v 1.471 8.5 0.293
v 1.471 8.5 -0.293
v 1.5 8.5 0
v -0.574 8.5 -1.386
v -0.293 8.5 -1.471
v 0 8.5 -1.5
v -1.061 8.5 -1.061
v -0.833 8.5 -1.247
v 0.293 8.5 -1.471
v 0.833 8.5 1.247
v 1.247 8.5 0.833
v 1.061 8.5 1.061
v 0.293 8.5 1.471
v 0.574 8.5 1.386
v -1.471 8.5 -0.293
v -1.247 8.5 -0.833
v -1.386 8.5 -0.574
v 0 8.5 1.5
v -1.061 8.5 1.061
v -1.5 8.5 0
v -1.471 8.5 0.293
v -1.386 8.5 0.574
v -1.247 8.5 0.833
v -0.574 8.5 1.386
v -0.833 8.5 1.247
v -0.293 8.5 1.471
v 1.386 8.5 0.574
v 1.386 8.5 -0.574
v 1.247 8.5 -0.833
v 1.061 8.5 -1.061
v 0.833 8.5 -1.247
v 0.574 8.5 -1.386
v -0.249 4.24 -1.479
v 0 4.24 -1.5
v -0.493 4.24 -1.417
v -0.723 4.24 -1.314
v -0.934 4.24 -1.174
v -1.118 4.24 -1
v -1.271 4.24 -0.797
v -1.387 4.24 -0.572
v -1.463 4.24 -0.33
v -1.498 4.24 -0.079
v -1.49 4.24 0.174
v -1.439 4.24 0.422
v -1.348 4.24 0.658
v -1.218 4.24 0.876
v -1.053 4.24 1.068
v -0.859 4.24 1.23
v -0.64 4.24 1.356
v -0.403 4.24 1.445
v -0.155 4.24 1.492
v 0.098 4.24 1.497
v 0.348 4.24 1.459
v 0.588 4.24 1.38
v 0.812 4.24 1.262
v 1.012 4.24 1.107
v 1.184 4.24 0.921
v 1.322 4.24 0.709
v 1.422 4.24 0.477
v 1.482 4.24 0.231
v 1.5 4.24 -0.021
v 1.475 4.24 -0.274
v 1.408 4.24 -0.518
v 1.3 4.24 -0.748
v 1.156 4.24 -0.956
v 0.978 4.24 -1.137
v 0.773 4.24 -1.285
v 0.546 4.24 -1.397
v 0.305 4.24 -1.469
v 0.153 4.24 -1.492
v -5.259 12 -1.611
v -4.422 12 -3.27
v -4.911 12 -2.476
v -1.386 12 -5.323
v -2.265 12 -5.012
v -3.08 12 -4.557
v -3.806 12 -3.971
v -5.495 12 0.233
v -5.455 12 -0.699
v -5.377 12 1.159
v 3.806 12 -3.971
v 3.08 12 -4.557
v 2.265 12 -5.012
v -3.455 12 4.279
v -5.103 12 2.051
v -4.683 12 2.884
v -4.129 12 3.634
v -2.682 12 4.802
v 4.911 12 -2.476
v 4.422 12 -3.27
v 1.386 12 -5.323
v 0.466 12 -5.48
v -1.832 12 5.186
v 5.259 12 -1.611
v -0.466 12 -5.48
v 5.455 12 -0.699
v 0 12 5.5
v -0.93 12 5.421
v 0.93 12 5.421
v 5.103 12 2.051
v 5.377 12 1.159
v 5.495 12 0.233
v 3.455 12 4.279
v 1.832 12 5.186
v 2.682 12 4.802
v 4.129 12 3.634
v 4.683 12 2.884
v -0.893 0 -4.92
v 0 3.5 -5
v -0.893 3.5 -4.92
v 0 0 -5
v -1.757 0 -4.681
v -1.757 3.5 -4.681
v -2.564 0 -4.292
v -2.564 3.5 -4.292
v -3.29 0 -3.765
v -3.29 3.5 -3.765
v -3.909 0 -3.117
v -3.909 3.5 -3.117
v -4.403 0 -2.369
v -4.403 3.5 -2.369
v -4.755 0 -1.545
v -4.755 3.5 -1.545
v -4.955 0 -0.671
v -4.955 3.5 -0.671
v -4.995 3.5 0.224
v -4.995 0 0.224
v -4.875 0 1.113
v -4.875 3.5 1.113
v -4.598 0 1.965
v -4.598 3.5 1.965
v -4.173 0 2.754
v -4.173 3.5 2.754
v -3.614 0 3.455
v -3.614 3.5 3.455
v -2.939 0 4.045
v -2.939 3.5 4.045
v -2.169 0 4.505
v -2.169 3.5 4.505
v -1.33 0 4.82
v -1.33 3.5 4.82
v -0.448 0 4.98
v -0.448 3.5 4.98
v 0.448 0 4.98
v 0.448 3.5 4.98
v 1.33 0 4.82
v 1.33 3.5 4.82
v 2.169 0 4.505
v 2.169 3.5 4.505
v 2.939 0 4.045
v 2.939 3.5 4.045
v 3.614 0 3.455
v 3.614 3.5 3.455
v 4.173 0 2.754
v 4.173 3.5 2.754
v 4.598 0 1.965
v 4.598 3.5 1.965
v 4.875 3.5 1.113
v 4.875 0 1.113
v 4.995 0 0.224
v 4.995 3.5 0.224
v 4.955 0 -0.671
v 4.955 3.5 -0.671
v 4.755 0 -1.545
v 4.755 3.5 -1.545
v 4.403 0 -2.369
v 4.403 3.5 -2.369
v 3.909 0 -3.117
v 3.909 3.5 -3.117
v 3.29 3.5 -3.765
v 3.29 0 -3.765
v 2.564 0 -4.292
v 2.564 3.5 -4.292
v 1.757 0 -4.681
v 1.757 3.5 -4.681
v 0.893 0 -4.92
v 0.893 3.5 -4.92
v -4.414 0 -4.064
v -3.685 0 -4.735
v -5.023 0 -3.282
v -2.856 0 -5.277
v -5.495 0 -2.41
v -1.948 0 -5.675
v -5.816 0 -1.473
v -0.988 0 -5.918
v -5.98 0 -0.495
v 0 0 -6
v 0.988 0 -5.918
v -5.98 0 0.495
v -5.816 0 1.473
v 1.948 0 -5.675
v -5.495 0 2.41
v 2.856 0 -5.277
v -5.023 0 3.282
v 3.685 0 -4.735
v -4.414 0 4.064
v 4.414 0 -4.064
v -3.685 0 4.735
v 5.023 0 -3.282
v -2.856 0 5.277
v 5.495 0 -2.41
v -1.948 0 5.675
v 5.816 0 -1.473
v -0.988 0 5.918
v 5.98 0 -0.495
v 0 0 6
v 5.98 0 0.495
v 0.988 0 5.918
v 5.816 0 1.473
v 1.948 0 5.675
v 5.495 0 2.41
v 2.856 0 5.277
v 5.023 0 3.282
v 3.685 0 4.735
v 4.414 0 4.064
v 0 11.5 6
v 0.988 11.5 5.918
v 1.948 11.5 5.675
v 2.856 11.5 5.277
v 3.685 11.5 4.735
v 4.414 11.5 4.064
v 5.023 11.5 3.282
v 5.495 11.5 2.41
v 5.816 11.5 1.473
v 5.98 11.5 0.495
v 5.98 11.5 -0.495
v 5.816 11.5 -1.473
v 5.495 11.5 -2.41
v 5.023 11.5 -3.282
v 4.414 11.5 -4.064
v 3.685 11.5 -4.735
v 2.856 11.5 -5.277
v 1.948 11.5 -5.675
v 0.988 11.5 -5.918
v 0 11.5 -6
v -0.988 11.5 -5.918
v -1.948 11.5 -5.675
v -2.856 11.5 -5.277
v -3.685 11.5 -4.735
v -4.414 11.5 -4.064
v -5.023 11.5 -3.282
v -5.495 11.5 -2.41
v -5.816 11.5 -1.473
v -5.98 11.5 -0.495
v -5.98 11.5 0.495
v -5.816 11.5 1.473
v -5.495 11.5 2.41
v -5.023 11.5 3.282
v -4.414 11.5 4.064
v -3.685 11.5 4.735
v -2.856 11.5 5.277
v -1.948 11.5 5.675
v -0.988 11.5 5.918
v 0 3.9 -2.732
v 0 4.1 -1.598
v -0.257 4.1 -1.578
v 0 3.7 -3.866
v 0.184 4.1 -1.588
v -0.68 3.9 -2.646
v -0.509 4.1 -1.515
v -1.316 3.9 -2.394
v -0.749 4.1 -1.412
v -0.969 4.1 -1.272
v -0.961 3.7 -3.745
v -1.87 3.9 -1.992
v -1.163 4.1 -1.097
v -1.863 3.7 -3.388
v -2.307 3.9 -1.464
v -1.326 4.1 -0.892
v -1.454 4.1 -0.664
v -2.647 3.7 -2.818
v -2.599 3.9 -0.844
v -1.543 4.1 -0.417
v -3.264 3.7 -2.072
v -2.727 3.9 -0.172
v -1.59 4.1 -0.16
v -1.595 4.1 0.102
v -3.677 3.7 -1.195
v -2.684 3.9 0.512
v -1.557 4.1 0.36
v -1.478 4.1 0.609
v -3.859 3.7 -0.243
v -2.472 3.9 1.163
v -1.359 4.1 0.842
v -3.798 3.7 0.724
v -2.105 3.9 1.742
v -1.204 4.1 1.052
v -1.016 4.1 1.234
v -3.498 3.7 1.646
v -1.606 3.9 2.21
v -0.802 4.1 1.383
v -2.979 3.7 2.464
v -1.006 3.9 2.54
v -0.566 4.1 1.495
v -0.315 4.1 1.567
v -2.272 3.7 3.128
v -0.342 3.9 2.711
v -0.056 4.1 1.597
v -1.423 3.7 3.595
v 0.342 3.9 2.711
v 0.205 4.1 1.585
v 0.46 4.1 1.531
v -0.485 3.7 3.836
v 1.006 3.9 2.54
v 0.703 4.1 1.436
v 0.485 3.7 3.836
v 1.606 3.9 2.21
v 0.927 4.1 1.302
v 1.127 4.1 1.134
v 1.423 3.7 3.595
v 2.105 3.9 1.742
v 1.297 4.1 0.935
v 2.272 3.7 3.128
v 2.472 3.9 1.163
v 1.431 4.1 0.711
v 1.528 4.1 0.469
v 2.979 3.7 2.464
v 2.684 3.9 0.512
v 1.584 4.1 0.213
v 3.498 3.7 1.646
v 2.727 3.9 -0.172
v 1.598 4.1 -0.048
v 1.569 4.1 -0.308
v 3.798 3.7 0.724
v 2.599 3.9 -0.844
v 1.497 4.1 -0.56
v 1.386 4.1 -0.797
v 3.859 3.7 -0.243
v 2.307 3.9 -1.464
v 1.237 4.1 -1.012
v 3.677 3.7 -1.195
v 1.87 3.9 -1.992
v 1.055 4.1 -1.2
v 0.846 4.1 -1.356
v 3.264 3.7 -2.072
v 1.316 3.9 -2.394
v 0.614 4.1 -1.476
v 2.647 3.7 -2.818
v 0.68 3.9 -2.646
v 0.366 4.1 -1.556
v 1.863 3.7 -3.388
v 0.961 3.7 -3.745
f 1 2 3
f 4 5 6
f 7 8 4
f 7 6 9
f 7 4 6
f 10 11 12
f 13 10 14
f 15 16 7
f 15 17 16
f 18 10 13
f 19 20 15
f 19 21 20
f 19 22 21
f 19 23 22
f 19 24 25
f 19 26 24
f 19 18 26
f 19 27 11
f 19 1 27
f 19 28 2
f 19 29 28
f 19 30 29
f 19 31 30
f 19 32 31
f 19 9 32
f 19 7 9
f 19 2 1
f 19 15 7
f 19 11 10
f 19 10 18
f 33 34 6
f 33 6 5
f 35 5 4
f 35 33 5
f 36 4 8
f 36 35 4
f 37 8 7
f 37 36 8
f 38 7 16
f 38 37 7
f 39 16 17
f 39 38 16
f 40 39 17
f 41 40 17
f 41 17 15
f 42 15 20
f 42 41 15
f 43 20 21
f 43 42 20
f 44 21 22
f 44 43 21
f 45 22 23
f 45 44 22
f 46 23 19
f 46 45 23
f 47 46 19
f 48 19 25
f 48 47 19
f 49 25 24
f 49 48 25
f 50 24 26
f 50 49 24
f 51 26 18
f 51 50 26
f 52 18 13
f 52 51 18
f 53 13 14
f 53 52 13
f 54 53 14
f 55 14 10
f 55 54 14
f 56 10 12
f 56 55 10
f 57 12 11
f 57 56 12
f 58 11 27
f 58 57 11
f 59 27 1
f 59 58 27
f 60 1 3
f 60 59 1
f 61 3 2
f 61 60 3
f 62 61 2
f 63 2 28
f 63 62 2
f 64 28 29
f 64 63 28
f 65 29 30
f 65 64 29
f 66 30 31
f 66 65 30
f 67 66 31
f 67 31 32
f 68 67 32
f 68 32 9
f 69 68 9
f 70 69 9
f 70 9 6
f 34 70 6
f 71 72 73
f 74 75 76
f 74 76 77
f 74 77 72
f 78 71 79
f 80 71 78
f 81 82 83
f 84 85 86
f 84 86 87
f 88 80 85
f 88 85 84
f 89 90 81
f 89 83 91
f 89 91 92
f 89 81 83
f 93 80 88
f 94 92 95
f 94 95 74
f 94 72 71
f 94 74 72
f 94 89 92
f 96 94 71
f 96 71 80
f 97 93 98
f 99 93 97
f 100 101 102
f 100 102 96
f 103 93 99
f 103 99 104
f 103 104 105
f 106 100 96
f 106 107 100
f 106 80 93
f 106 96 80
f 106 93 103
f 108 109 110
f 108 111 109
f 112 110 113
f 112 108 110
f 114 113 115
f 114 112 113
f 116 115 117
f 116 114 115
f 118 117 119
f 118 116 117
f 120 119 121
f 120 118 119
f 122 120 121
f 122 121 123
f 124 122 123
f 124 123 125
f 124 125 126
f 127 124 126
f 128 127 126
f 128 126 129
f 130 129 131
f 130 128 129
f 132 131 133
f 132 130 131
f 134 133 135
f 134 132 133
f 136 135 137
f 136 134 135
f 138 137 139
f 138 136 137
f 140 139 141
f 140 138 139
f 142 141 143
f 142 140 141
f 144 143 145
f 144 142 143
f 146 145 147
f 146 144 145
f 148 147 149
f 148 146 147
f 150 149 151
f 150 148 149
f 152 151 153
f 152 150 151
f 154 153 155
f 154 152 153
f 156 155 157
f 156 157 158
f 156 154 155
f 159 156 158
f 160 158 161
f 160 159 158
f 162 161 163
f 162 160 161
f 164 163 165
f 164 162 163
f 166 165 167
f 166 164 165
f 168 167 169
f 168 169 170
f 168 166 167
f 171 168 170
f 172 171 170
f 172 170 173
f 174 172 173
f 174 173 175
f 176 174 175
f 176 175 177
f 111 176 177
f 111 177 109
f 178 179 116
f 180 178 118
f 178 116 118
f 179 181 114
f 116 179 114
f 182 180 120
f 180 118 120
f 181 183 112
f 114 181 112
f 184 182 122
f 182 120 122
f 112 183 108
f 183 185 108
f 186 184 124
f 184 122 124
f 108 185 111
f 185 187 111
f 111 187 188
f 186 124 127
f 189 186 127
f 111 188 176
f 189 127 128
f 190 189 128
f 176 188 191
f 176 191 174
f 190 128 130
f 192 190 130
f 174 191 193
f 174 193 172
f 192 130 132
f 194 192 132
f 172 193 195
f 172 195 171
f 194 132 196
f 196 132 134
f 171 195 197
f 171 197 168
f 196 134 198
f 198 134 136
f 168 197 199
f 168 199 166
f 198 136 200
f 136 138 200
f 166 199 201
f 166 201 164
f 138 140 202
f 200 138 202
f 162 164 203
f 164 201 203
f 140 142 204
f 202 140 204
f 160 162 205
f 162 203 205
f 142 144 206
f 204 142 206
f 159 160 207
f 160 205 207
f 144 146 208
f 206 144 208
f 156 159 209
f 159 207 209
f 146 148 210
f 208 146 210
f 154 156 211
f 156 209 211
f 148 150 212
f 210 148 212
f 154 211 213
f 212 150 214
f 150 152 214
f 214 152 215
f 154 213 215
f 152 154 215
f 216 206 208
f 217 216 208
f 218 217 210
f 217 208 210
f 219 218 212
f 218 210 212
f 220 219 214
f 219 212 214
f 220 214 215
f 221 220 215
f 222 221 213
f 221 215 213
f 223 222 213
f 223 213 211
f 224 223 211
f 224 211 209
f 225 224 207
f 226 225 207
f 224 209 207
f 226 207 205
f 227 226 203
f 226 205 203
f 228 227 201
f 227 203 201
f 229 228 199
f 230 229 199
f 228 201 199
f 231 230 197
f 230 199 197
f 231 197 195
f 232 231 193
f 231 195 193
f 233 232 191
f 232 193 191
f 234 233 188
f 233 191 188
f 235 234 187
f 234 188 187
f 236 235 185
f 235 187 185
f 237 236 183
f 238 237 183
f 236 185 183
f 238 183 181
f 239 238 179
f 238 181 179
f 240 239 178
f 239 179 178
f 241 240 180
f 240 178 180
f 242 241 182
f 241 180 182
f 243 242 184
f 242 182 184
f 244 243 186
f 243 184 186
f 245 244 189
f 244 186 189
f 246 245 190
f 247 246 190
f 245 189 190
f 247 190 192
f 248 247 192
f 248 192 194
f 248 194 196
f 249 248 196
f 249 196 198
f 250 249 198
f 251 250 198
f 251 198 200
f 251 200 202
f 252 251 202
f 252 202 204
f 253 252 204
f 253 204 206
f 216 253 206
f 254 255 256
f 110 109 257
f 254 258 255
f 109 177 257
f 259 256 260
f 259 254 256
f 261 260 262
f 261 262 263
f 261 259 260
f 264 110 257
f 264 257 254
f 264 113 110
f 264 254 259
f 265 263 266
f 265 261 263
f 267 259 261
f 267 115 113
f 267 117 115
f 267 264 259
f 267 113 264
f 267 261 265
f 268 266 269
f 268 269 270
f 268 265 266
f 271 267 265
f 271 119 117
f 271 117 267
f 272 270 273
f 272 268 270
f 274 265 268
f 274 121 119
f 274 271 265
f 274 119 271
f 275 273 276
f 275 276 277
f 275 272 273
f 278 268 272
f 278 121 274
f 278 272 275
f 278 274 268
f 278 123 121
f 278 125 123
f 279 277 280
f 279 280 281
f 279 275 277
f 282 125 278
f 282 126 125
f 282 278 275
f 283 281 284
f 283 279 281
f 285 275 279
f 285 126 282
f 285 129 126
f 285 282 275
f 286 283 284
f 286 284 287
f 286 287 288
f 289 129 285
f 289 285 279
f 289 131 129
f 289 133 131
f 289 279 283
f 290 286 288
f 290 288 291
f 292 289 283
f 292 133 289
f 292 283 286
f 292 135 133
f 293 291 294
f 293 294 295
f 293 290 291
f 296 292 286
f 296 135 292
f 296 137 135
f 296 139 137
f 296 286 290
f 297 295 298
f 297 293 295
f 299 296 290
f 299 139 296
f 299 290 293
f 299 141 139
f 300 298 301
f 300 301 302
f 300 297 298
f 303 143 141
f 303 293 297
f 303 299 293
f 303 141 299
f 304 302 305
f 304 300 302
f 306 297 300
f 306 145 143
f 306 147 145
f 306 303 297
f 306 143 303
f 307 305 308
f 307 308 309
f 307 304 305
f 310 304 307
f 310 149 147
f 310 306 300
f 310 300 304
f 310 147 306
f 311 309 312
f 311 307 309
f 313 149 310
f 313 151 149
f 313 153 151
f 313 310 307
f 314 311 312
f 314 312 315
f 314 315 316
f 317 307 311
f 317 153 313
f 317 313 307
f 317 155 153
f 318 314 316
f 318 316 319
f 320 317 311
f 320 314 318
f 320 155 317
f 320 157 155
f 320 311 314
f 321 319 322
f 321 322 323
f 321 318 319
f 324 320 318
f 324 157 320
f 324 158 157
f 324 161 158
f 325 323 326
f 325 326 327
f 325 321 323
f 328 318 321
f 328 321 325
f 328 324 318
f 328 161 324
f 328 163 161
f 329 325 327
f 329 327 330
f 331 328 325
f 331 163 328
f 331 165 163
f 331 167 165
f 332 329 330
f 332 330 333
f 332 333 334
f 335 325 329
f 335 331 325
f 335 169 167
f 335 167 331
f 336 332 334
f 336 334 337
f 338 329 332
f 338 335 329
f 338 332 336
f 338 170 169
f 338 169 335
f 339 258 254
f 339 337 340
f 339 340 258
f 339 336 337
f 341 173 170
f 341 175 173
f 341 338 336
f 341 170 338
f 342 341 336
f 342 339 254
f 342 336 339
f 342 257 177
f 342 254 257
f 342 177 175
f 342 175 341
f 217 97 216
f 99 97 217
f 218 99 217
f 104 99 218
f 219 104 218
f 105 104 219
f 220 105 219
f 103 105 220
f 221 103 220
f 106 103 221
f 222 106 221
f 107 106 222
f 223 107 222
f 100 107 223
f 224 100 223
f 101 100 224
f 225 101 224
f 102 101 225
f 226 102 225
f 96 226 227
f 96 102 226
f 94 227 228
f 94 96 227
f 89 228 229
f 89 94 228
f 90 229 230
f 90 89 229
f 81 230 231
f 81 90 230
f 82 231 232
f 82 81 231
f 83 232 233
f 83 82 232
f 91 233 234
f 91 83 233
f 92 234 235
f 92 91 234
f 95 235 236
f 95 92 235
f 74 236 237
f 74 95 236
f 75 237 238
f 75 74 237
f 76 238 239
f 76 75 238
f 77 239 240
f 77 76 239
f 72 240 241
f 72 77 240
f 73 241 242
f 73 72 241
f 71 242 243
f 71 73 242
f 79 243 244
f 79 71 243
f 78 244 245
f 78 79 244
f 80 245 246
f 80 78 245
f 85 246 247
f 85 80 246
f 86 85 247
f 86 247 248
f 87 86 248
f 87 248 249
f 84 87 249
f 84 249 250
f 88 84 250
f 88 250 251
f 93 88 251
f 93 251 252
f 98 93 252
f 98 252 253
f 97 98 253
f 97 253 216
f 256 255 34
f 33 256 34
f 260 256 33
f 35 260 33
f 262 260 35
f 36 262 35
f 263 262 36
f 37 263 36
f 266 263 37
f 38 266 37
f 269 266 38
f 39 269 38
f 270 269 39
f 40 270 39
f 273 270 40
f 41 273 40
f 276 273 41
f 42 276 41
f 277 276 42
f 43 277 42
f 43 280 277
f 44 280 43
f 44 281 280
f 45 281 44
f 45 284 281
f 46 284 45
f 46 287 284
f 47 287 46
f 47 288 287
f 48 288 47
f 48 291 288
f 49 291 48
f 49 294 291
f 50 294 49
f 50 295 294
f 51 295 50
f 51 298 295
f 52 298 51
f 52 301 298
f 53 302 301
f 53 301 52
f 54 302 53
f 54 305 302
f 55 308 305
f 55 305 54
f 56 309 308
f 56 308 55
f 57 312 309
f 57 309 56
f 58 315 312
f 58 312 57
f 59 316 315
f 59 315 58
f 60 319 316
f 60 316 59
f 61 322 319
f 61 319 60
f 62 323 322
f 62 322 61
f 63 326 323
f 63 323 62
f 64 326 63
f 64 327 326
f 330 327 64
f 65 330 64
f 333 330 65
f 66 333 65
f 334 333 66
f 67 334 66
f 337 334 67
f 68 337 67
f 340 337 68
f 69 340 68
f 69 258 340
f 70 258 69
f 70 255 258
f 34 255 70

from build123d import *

# Parameters (mm, degrees)
SKETCH1_R           = 6
BOSS_EXTRUDE1_DEPTH = 12
CHAMFER1_SIZE       = 0.1
CHAMFER1_SIZE2      = 0.123280305
CHAMFER2_SIZE       = 0.5


with BuildPart() as part:
    # Sketch1 → Boss-Extrude1 (new body)
    with BuildSketch(Plane(origin=(0, 0, 0), x_dir=(1, 0, 0), z_dir=(0, 1, 0))):
        with Locations(Location((0, 0, 0), (0, 0, 270))):
            Circle(SKETCH1_R)
    extrude(amount=BOSS_EXTRUDE1_DEPTH)

    # Sketch2 → Cut-Revolve1 (revolve, cut)
    with BuildSketch(Plane.XY, mode=Mode.PRIVATE) as cut_revolve1_sk:
        Polygon((5, 0), (0, 0), (0, 8.5), (1.5, 8.5), (1.5, 4.117144432), (5, 3.5), align=None)
    revolve(cut_revolve1_sk.sketch.rotate(Axis((0, 0, 0), (0, 1, 0)), 90), axis=Axis((0, 0, 0), (0, 1, 0)), mode=Mode.SUBTRACT)

    # Chamfer1
    chamfer1_edges = [part.edges().sort_by_distance(p)[0] for p in [
        (0, 4.117144432, 1.5),
    ]]
    chamfer1_side = [part.faces().sort_by_distance(p)[0] for p in [
        (0, 3.808572216, 3.25),
    ]]
    chamfer(chamfer1_edges, length=CHAMFER1_SIZE, length2=CHAMFER1_SIZE2, reference=chamfer1_side[0])

    # Chamfer2
    chamfer2_edges = [part.edges().sort_by_distance(p)[0] for p in [
        (0, 12, -6),
    ]]
    chamfer(chamfer2_edges, length=CHAMFER2_SIZE)


solid = part.part
